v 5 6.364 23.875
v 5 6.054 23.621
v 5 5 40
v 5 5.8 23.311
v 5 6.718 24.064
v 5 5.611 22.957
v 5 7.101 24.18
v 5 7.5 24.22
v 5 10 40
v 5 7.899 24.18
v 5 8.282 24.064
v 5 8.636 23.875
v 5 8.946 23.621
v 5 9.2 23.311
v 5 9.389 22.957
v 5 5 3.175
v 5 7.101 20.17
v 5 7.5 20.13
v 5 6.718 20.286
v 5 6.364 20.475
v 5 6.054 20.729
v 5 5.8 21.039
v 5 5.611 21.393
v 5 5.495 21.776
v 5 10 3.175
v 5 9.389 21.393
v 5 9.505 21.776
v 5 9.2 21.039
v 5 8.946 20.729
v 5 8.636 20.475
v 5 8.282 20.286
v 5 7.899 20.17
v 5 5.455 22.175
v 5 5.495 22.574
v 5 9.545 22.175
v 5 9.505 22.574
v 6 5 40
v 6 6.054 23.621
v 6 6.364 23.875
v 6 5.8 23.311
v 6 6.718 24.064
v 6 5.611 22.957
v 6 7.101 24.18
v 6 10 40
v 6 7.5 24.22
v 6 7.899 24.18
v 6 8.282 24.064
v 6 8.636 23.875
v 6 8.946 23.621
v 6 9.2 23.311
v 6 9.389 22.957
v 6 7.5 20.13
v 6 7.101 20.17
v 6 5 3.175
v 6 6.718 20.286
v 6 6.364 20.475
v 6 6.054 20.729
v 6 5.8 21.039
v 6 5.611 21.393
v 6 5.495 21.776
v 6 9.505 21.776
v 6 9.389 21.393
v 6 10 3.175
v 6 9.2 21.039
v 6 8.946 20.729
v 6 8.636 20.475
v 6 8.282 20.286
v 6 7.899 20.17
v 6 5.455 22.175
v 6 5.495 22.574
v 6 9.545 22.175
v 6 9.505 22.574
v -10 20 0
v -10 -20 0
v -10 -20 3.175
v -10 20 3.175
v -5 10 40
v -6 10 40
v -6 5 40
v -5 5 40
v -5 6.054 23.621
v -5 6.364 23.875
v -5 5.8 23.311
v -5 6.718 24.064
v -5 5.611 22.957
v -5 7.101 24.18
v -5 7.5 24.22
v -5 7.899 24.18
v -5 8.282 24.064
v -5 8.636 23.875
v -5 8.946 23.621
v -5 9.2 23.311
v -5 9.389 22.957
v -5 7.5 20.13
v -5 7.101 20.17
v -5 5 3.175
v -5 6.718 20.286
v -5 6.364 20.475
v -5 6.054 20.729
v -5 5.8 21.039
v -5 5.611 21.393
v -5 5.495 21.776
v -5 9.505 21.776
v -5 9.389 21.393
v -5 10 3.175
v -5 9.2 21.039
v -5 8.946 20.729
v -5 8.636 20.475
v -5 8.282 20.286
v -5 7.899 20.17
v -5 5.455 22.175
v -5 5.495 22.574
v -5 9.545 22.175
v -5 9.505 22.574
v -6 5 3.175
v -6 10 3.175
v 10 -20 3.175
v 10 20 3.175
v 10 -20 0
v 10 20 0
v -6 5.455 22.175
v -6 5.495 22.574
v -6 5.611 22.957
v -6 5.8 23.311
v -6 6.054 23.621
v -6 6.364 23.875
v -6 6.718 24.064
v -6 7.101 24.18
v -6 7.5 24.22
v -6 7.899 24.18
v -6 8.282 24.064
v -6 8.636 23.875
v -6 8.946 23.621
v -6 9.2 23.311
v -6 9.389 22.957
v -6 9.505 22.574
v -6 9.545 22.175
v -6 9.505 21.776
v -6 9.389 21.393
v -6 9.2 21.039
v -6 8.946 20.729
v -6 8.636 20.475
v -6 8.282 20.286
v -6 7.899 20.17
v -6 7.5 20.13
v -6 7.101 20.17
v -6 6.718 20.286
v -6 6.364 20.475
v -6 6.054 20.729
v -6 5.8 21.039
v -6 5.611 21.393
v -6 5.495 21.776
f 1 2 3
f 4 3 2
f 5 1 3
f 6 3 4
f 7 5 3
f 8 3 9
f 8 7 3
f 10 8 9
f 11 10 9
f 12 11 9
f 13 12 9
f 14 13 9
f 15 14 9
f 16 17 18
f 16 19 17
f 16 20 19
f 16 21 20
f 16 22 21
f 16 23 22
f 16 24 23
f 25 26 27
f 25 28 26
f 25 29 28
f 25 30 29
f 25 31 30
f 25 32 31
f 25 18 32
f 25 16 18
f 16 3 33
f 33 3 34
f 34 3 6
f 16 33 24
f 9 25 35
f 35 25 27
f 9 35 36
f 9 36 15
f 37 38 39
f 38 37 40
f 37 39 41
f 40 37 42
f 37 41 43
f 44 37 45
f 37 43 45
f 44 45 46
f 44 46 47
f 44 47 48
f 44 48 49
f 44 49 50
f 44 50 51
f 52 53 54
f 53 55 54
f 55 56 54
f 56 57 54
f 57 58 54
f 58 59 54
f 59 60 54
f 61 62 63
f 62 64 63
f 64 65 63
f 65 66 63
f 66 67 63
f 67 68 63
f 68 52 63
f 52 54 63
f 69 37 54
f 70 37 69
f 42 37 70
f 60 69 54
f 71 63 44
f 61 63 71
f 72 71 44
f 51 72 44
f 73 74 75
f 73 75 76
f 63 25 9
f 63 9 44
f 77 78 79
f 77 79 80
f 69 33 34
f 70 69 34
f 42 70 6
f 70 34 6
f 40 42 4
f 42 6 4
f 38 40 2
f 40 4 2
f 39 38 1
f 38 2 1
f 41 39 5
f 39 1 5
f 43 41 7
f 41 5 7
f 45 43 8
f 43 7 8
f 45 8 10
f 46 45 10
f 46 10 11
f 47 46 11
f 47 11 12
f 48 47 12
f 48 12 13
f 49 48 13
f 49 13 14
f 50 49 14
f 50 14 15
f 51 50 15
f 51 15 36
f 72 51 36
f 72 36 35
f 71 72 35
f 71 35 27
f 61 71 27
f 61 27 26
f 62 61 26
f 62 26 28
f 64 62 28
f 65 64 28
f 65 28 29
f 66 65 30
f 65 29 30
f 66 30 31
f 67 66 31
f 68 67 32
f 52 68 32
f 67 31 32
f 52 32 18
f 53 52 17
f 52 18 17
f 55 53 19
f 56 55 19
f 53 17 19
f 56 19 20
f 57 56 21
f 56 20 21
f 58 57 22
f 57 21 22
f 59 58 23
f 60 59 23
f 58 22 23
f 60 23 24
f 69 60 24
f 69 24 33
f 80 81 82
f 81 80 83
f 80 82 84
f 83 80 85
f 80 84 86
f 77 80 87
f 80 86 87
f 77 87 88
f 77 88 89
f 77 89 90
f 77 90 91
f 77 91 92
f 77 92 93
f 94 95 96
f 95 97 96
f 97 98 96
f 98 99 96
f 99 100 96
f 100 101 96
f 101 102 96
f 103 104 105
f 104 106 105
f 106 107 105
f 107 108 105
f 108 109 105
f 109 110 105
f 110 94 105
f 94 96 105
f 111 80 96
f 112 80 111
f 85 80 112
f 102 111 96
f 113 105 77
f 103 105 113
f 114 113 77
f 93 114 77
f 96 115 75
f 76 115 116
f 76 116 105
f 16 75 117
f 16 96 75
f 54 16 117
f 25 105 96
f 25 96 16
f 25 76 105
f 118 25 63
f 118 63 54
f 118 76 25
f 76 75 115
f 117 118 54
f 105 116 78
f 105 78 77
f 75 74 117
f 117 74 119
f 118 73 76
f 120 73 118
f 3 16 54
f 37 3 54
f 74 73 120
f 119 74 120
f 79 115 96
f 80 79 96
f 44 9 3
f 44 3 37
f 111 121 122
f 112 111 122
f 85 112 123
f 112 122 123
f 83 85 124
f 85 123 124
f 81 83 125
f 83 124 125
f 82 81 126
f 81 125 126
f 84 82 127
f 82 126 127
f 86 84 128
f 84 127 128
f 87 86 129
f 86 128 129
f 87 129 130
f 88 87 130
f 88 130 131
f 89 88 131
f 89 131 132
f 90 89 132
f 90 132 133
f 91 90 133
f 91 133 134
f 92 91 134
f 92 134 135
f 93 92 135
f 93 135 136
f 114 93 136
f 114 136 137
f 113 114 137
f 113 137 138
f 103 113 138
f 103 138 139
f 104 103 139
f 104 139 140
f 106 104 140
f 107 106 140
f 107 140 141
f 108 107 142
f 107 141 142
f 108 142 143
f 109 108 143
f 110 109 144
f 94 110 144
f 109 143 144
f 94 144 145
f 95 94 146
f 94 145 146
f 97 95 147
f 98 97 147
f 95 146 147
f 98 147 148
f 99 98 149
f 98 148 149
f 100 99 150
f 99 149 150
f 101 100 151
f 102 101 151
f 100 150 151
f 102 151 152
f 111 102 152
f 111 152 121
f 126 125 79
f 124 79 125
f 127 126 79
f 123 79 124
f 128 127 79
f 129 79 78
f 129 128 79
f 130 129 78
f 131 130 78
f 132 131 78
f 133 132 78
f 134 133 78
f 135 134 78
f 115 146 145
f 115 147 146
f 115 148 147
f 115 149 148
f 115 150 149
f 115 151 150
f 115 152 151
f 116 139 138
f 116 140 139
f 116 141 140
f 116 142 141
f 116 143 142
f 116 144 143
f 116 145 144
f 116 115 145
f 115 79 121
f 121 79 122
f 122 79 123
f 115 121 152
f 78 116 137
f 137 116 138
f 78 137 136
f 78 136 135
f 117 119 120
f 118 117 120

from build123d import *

# Parameters (mm, degrees)
F0_W     = 20
F0_H     = 40
F0_W_2   = 1
F0_H_2   = 5
F1_DEPTH = 3.175
F2_DEPTH = 40
F4_D     = 4.0894


# Not quite as in the source:
# - a length typed as a fraction of an inch, garbled in the dataset ("3 / 203.2 mm" for 3/8 in), is restored


with BuildPart() as f1:
    # F0 (on Top) → F1 (new body)
    with BuildSketch(Plane.XY):
        Rectangle(F0_W, F0_H)
        with Locations((-5.5, 7.5)):
            Rectangle(F0_W_2, F0_H_2, mode=Mode.SUBTRACT)
        with Locations((5.5, 7.5)):
            Rectangle(F0_W_2, F0_H_2, mode=Mode.SUBTRACT)
    extrude(amount=F1_DEPTH)

    # F0 (on Top) → F2 (join)
    with BuildSketch(Plane.XY):
        with Locations((-5.5, 7.5)):
            Rectangle(F0_W_2, F0_H_2)
        with Locations((5.5, 7.5)):
            Rectangle(F0_W_2, F0_H_2)
    extrude(amount=F2_DEPTH)

    # F4 (through all)
    with Locations(Plane.YZ.offset(6)):
        with Locations((7.5, 22.175)):
            Hole(F4_D / 2)


solid = f1.part
